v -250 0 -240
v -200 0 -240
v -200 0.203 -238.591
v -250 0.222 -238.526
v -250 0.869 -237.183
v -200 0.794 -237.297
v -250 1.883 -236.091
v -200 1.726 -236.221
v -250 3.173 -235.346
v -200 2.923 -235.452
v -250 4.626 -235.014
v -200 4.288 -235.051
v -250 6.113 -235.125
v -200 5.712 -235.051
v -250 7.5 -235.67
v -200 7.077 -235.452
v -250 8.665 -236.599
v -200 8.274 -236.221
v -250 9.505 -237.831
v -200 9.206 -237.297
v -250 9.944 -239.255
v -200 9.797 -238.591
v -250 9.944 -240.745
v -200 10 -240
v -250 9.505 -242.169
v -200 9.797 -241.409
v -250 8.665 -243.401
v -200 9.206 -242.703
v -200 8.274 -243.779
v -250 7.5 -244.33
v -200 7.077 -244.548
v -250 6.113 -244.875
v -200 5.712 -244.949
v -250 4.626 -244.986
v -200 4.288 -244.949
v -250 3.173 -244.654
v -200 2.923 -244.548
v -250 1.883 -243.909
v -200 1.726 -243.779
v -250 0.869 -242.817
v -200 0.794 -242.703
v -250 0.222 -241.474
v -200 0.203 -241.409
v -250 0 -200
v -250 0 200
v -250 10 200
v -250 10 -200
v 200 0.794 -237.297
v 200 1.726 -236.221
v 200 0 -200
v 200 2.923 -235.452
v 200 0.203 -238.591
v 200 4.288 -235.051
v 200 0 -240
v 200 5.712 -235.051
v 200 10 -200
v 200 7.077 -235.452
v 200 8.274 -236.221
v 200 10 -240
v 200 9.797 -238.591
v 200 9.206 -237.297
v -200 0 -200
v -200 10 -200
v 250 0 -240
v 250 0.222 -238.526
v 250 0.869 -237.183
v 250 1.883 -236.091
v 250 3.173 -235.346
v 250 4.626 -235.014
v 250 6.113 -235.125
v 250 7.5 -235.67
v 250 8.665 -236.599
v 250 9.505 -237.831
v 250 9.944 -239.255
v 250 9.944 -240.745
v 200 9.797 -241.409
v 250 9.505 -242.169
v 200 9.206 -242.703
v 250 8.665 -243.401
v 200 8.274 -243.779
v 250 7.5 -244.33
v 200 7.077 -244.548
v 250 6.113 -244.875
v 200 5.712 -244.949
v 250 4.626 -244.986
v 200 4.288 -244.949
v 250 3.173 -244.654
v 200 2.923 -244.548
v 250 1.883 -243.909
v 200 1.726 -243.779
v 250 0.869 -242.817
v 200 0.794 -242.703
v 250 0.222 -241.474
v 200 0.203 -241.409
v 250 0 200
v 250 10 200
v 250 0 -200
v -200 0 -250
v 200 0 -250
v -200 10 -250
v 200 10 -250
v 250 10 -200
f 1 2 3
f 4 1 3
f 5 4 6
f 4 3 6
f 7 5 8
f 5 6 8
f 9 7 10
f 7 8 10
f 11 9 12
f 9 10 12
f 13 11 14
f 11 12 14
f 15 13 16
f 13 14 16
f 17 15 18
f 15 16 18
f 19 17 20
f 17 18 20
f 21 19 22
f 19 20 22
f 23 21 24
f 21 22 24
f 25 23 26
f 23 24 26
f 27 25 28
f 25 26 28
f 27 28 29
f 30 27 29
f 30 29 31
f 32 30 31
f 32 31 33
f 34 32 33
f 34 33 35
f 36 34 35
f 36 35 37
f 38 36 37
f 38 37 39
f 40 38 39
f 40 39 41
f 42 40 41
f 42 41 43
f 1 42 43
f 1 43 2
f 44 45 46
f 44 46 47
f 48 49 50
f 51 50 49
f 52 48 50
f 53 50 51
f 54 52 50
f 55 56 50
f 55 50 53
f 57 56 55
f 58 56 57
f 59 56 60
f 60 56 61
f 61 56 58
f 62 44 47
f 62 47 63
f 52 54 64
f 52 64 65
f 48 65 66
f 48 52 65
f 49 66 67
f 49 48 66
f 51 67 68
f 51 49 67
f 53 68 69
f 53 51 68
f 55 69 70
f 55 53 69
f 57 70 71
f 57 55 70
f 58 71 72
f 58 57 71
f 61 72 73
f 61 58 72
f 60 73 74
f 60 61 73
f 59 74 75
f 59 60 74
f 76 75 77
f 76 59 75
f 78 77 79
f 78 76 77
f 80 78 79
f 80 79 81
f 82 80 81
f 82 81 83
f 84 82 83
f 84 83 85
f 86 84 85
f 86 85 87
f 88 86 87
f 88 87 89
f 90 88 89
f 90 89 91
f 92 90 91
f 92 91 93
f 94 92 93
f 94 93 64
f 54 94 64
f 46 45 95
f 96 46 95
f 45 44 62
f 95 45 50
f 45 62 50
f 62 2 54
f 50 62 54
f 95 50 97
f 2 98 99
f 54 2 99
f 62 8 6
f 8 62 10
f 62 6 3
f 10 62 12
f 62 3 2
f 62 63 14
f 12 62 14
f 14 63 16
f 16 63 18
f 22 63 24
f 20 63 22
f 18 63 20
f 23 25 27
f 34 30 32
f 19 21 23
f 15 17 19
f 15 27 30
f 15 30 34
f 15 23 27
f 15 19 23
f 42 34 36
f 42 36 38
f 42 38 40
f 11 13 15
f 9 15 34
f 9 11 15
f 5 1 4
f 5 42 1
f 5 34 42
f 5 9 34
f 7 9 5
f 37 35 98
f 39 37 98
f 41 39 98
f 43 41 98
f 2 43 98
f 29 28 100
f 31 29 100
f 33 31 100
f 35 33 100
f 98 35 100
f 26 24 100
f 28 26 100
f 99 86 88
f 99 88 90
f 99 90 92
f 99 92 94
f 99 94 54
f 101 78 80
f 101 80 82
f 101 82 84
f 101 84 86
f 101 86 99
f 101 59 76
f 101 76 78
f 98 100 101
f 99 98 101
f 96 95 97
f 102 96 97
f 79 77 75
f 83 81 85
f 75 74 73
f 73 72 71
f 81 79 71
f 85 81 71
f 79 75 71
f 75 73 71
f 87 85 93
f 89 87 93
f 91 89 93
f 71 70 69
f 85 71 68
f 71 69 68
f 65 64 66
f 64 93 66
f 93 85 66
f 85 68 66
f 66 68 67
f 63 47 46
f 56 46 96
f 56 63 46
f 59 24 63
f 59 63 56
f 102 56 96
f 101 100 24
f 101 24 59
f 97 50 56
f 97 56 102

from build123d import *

# Parameters (mm, degrees)
SKETCH1_W           = 500
SKETCH1_H           = 400
BOSS_EXTRUDE1_DEPTH = 10
SKETCH2_W           = 400
SKETCH2_H           = 50
BOSS_EXTRUDE2_DEPTH = 10
SKETCH3_R           = 5
BOSS_EXTRUDE5_DEPTH = 50


with BuildPart() as part:
    # Sketch1 → Boss-Extrude1 (new body)
    with BuildSketch(Plane(origin=(0, 0, 0), x_dir=(1, 0, 0), z_dir=(0, 1, 0))):
        Rectangle(SKETCH1_W, SKETCH1_H)
    extrude(amount=BOSS_EXTRUDE1_DEPTH)

    # Sketch2 → Boss-Extrude2 (add)
    with BuildSketch(Plane(origin=(0, 10, 0), x_dir=(1, 0, 0), z_dir=(0, 1, 0))):
        with Locations((0, 225)):
            Rectangle(SKETCH2_W, SKETCH2_H)
    extrude(amount=-BOSS_EXTRUDE2_DEPTH)

    # Sketch3 → Boss-Extrude5 (add)
    with BuildSketch(Plane.ZY.offset(200)):
        with Locations(Location((-240, 5, 0), (0, 0, 270))):
            Circle(SKETCH3_R)
    boss_extrude5 = extrude(amount=BOSS_EXTRUDE5_DEPTH)

    # Mirror1: Boss-Extrude5 across plane
    add(boss_extrude5.mirror(Plane(origin=(0, 0, 0), x_dir=(0, 0, 1), z_dir=(1, 0, 0))))


solid = part.part
